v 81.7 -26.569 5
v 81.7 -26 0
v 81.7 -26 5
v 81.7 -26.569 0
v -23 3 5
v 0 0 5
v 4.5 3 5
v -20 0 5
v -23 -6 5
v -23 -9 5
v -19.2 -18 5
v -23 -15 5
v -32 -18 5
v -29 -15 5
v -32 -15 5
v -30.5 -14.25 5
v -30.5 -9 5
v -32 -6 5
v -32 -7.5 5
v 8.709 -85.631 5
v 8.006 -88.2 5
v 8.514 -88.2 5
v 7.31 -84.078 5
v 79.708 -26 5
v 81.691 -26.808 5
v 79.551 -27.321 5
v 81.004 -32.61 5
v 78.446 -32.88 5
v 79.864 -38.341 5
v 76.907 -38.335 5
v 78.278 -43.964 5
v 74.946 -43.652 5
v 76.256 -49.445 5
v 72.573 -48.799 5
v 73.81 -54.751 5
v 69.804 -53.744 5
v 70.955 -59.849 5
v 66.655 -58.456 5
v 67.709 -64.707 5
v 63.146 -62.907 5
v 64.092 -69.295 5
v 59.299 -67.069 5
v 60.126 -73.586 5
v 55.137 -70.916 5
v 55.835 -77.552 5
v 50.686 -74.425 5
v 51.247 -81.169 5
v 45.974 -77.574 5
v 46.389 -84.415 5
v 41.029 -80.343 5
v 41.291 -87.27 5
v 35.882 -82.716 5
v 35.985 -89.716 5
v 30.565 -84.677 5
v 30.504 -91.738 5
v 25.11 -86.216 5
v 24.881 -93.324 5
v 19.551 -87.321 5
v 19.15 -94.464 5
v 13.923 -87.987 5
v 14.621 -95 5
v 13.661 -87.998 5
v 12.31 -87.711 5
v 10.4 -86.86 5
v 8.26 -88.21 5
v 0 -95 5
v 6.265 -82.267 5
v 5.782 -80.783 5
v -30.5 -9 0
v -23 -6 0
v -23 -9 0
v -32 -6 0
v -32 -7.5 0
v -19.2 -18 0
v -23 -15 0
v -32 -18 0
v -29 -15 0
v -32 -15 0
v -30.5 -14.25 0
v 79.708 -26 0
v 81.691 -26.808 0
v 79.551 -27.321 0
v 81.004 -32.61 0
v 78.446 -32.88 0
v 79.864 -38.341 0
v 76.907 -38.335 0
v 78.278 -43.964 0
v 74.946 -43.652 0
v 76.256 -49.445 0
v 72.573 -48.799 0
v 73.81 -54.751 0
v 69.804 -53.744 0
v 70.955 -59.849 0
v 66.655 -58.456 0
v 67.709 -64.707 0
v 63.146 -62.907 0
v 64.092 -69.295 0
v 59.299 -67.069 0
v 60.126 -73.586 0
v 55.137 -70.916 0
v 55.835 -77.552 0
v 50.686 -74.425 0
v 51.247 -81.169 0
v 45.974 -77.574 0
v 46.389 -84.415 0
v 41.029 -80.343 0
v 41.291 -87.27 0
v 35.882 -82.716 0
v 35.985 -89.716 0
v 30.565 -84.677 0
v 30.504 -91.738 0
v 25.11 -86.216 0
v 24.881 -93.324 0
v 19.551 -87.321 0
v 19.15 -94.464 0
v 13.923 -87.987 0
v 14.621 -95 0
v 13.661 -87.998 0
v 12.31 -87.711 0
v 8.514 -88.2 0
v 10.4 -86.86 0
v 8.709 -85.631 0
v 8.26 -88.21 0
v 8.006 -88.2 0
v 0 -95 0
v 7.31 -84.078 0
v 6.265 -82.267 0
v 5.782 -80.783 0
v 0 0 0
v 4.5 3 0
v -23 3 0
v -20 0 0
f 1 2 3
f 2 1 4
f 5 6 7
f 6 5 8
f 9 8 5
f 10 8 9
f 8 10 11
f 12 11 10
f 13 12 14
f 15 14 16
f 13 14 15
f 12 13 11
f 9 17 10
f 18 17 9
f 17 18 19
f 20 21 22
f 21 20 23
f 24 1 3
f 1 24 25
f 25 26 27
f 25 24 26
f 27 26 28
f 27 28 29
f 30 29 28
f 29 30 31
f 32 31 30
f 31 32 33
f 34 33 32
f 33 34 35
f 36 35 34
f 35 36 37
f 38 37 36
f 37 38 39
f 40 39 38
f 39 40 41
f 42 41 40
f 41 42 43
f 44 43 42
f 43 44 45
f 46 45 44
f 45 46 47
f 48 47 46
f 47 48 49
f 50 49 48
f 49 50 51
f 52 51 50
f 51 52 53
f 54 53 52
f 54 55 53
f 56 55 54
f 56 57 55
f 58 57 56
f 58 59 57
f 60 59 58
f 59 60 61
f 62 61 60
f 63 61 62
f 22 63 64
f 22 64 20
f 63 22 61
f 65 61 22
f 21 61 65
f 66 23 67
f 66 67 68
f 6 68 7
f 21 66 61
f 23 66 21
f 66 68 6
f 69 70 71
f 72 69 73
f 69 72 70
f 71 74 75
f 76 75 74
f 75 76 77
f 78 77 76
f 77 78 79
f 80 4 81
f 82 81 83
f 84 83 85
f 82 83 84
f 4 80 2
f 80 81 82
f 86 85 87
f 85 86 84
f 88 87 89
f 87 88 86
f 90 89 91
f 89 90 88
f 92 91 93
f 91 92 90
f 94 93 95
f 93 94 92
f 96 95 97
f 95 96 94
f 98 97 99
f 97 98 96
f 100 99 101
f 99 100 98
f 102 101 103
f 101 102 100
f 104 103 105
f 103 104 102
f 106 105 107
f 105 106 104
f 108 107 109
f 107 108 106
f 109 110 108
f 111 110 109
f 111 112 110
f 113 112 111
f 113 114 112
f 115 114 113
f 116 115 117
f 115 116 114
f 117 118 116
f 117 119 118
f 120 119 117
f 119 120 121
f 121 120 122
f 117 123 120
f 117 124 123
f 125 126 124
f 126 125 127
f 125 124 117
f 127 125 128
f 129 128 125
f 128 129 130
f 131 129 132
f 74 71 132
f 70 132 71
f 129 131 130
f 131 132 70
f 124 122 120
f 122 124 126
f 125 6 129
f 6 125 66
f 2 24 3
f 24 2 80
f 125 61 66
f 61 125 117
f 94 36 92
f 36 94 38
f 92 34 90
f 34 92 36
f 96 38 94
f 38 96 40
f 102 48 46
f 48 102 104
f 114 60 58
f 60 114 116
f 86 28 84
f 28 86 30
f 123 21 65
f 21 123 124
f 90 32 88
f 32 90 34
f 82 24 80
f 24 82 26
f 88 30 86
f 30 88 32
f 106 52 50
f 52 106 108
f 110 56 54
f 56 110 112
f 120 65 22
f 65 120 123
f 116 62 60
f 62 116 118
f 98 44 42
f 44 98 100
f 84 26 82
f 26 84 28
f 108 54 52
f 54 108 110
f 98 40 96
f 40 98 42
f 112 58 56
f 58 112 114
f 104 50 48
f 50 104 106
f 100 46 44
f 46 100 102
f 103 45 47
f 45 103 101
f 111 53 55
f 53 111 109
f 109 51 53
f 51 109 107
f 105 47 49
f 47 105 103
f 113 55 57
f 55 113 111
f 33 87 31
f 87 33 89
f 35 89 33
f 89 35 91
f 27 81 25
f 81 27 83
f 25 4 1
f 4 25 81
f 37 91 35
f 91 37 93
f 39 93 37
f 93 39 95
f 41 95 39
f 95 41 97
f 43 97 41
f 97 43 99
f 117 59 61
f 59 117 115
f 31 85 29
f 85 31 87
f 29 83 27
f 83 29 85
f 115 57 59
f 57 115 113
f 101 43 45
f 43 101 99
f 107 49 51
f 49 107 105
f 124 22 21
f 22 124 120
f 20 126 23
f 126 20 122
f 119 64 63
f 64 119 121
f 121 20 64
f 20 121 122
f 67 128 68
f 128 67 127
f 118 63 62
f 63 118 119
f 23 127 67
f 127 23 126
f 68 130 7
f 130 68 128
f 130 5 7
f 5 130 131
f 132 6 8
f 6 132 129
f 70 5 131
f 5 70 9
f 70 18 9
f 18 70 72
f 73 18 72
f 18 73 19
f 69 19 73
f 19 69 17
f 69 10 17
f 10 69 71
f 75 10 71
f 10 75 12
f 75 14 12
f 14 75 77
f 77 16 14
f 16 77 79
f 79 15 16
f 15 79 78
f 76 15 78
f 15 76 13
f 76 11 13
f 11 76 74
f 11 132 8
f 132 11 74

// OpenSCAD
// Height from top of wall to bottom of hayrack
main_height = 95;

// Thickness of wall where rack will be mounted
wall_width = 20;

// Height of wooden bar
bar_height = 6;

// Width of wooden bar
bar_width = 6;

// Length of wooden bar fixation
fixation_height = 18;

// Thickness
depth = 5;

/* [Hidden] */
fixation_width=3;

module fixation () {
  linear_extrude(height=depth)polygon(points=[
	[0,0],
	[-wall_width,0],
   [-wall_width+0.8, -fixation_height],
   [-wall_width-fixation_width-bar_width-fixation_width,-fixation_height],
   [-wall_width-fixation_width-bar_width-fixation_width,-fixation_height+fixation_width],
   [-wall_width-fixation_width-bar_width-fixation_width/2, -fixation_height+fixation_width+fixation_width*0.25],
   [-wall_width-fixation_width-bar_width,-fixation_height+fixation_width],
   [-wall_width-fixation_width,-fixation_height+fixation_width], // Point 8
   [-wall_width-fixation_width,-fixation_height+fixation_width+bar_height],
   [-wall_width-fixation_width-bar_width-fixation_width/2,-fixation_height+fixation_width+bar_height],
   [-wall_width-fixation_width-bar_width-fixation_width,-fixation_height+fixation_width+bar_height+fixation_width/2],
   [-wall_width-fixation_width-bar_width-fixation_width,-fixation_height+fixation_width+bar_height+fixation_width],
   [-wall_width-fixation_width,-fixation_height+2*fixation_width+bar_height],
   [-wall_width-fixation_width,fixation_width],
   [0, fixation_width],
]);
}



module rack () {
  lower_curve_radius = 10;
  lower_curve_center = [fixation_width*1.8+lower_curve_radius,-main_height+16.8,0];
  inner_hook_center = [8.26,-main_height+78.97,0];
  inner_hook_radius = 72.18;
  outer_hook_center = [7.51, -main_height+74.03,0];
  outer_hook_radius = 74.41; 

  hook_x = 81.7;
  hook_y = 69; //main_height - 26.2;

  linear_extrude(height=depth)polygon(points=[
	[0,fixation_width],
   [0,-main_height],
   [fixation_width*2,-main_height],
   [fixation_width*1.5,fixation_width]
]);

  intersection(){
    difference() {
      translate([0,-main_height,0])cube([hook_x, hook_y, depth]);
        
      translate([0,0,-0.5])translate(inner_hook_center)cylinder(r=inner_hook_radius,depth+1, $fn=80);
    }
    translate(outer_hook_center)cylinder(r=outer_hook_radius, depth, $fn=80);
  }
  translate(lower_curve_center)difference(){
    translate([-lower_curve_radius,-lower_curve_radius,0])cube([lower_curve_radius,lower_curve_radius,depth]);
    translate([0,0,-0.5])cylinder(r=lower_curve_radius, h=depth+1);
  }
}



fixation();
rack();
